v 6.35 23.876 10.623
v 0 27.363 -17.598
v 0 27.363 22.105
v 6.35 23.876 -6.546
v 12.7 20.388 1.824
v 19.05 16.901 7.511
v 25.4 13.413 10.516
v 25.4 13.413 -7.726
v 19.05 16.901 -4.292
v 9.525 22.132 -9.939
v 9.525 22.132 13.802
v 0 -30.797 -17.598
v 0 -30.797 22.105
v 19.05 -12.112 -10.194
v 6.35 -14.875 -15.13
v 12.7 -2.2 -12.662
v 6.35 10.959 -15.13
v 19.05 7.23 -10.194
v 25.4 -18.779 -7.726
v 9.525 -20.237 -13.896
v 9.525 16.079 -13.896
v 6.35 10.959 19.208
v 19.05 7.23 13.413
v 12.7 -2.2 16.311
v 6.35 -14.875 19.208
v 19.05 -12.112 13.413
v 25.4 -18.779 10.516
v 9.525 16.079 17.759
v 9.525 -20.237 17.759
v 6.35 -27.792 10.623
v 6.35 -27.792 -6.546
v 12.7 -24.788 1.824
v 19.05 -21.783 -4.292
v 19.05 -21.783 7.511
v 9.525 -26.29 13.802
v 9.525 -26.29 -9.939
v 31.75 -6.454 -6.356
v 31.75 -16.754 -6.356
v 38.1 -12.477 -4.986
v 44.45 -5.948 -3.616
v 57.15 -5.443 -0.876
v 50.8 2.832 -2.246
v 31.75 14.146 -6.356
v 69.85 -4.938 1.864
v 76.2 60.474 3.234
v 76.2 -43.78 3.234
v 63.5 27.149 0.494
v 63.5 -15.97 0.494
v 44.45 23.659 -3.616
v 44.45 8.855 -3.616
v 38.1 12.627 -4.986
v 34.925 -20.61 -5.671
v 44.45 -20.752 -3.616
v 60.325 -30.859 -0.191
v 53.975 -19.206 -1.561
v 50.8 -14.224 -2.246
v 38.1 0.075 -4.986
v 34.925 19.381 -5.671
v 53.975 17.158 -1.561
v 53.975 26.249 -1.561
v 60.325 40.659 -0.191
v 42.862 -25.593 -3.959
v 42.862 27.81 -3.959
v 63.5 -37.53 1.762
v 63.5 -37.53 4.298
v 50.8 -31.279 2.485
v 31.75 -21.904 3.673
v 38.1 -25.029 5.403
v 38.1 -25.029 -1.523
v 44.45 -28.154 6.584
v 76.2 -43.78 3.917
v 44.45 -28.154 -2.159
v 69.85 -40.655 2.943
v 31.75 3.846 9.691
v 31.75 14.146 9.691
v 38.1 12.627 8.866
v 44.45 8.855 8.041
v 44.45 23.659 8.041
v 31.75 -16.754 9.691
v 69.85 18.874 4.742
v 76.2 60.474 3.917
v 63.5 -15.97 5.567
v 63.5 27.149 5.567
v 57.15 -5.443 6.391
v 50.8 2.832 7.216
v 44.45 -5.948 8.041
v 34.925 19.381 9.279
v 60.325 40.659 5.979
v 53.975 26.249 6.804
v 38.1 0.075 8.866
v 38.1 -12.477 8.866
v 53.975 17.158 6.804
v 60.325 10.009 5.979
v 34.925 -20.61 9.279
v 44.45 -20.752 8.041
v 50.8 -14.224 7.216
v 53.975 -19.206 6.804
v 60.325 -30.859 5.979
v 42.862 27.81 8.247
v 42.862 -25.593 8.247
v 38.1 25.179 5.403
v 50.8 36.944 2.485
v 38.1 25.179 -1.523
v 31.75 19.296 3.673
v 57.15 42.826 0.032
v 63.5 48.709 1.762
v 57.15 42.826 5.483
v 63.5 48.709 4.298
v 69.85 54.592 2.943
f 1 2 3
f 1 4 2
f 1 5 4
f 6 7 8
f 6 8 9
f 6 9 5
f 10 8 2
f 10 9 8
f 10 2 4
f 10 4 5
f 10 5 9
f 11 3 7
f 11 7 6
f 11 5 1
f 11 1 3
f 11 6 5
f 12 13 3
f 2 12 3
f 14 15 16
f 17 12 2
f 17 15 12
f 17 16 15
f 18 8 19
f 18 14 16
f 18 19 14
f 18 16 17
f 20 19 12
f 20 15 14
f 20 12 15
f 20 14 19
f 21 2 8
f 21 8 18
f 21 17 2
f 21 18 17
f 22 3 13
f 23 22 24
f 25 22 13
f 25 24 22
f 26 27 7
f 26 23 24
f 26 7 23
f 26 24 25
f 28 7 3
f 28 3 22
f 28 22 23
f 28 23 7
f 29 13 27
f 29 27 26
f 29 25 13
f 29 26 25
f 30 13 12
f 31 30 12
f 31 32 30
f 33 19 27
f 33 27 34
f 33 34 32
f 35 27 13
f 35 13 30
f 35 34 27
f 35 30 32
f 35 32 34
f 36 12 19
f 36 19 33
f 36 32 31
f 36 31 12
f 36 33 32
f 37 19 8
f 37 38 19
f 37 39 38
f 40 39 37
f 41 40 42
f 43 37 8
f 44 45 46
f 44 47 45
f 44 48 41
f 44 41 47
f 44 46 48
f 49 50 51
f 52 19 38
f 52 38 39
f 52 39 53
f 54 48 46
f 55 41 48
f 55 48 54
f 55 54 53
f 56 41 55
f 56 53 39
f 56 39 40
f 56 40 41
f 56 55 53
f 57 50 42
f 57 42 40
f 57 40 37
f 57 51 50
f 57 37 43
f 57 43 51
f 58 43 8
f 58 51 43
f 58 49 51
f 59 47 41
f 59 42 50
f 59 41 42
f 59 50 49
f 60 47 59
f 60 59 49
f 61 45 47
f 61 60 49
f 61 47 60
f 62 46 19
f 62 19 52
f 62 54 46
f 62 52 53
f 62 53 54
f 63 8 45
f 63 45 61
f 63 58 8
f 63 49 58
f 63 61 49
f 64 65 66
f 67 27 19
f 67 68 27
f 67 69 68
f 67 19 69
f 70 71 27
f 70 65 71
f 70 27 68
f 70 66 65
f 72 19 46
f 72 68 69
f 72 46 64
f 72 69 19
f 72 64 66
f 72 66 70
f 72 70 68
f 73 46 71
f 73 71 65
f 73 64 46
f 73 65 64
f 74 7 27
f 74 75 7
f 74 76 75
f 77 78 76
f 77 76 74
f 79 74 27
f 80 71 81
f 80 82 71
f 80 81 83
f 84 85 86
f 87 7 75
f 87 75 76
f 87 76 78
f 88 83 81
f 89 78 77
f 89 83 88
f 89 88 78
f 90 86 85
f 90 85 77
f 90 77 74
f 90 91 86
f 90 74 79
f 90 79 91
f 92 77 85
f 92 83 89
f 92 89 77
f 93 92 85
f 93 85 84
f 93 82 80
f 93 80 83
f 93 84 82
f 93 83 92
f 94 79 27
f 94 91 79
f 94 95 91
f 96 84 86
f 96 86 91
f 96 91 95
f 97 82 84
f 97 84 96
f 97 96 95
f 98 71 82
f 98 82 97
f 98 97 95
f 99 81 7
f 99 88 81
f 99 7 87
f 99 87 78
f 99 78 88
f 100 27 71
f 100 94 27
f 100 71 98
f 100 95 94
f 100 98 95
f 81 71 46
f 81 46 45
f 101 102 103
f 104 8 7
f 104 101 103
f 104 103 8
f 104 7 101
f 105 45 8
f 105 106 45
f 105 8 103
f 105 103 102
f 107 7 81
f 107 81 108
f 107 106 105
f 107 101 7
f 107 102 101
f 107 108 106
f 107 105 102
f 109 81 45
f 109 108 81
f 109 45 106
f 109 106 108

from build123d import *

# Parameters (mm, degrees)
F0_W      = 58.1599026918
F0_H      = 39.7032555193
F2_W      = 32.1918288246
F2_H      = 18.2420359924
F3_FACE_W = 32.1918288246
F3_FACE_H = 18.2420359924
F5_W      = 104.2548157275
F5_H      = 0.6828915793


with BuildPart() as f3:
    # F0 (on Right) → F3 section 0
    with BuildSketch(Plane.YZ):
        with Locations((-1.7169099301, 2.2534271702)):
            Rectangle(F0_W, F0_H)
    # F2 (on offset) → F3 section 1
    with BuildSketch(Plane.YZ.offset(25.4)):
        with Locations((-2.6826648973, 1.3949791901)):
            Rectangle(F2_W, F2_H)
    loft()

    # F3_face (on face) → F6 section 0
    with BuildSketch(Plane(origin=(25.4, -2.6826648973, 1.3949791901), x_dir=(0, 1, 0), z_dir=(1, 0, 0))):
        Rectangle(F3_FACE_W, F3_FACE_H)
    # F5 (on offset) → F6 section 1
    with BuildSketch(Plane.YZ.offset(76.2)):
        with Locations((8.3470065147, 3.575253184)):
            Rectangle(F5_W, F5_H)
    loft()


solid = f3.part
